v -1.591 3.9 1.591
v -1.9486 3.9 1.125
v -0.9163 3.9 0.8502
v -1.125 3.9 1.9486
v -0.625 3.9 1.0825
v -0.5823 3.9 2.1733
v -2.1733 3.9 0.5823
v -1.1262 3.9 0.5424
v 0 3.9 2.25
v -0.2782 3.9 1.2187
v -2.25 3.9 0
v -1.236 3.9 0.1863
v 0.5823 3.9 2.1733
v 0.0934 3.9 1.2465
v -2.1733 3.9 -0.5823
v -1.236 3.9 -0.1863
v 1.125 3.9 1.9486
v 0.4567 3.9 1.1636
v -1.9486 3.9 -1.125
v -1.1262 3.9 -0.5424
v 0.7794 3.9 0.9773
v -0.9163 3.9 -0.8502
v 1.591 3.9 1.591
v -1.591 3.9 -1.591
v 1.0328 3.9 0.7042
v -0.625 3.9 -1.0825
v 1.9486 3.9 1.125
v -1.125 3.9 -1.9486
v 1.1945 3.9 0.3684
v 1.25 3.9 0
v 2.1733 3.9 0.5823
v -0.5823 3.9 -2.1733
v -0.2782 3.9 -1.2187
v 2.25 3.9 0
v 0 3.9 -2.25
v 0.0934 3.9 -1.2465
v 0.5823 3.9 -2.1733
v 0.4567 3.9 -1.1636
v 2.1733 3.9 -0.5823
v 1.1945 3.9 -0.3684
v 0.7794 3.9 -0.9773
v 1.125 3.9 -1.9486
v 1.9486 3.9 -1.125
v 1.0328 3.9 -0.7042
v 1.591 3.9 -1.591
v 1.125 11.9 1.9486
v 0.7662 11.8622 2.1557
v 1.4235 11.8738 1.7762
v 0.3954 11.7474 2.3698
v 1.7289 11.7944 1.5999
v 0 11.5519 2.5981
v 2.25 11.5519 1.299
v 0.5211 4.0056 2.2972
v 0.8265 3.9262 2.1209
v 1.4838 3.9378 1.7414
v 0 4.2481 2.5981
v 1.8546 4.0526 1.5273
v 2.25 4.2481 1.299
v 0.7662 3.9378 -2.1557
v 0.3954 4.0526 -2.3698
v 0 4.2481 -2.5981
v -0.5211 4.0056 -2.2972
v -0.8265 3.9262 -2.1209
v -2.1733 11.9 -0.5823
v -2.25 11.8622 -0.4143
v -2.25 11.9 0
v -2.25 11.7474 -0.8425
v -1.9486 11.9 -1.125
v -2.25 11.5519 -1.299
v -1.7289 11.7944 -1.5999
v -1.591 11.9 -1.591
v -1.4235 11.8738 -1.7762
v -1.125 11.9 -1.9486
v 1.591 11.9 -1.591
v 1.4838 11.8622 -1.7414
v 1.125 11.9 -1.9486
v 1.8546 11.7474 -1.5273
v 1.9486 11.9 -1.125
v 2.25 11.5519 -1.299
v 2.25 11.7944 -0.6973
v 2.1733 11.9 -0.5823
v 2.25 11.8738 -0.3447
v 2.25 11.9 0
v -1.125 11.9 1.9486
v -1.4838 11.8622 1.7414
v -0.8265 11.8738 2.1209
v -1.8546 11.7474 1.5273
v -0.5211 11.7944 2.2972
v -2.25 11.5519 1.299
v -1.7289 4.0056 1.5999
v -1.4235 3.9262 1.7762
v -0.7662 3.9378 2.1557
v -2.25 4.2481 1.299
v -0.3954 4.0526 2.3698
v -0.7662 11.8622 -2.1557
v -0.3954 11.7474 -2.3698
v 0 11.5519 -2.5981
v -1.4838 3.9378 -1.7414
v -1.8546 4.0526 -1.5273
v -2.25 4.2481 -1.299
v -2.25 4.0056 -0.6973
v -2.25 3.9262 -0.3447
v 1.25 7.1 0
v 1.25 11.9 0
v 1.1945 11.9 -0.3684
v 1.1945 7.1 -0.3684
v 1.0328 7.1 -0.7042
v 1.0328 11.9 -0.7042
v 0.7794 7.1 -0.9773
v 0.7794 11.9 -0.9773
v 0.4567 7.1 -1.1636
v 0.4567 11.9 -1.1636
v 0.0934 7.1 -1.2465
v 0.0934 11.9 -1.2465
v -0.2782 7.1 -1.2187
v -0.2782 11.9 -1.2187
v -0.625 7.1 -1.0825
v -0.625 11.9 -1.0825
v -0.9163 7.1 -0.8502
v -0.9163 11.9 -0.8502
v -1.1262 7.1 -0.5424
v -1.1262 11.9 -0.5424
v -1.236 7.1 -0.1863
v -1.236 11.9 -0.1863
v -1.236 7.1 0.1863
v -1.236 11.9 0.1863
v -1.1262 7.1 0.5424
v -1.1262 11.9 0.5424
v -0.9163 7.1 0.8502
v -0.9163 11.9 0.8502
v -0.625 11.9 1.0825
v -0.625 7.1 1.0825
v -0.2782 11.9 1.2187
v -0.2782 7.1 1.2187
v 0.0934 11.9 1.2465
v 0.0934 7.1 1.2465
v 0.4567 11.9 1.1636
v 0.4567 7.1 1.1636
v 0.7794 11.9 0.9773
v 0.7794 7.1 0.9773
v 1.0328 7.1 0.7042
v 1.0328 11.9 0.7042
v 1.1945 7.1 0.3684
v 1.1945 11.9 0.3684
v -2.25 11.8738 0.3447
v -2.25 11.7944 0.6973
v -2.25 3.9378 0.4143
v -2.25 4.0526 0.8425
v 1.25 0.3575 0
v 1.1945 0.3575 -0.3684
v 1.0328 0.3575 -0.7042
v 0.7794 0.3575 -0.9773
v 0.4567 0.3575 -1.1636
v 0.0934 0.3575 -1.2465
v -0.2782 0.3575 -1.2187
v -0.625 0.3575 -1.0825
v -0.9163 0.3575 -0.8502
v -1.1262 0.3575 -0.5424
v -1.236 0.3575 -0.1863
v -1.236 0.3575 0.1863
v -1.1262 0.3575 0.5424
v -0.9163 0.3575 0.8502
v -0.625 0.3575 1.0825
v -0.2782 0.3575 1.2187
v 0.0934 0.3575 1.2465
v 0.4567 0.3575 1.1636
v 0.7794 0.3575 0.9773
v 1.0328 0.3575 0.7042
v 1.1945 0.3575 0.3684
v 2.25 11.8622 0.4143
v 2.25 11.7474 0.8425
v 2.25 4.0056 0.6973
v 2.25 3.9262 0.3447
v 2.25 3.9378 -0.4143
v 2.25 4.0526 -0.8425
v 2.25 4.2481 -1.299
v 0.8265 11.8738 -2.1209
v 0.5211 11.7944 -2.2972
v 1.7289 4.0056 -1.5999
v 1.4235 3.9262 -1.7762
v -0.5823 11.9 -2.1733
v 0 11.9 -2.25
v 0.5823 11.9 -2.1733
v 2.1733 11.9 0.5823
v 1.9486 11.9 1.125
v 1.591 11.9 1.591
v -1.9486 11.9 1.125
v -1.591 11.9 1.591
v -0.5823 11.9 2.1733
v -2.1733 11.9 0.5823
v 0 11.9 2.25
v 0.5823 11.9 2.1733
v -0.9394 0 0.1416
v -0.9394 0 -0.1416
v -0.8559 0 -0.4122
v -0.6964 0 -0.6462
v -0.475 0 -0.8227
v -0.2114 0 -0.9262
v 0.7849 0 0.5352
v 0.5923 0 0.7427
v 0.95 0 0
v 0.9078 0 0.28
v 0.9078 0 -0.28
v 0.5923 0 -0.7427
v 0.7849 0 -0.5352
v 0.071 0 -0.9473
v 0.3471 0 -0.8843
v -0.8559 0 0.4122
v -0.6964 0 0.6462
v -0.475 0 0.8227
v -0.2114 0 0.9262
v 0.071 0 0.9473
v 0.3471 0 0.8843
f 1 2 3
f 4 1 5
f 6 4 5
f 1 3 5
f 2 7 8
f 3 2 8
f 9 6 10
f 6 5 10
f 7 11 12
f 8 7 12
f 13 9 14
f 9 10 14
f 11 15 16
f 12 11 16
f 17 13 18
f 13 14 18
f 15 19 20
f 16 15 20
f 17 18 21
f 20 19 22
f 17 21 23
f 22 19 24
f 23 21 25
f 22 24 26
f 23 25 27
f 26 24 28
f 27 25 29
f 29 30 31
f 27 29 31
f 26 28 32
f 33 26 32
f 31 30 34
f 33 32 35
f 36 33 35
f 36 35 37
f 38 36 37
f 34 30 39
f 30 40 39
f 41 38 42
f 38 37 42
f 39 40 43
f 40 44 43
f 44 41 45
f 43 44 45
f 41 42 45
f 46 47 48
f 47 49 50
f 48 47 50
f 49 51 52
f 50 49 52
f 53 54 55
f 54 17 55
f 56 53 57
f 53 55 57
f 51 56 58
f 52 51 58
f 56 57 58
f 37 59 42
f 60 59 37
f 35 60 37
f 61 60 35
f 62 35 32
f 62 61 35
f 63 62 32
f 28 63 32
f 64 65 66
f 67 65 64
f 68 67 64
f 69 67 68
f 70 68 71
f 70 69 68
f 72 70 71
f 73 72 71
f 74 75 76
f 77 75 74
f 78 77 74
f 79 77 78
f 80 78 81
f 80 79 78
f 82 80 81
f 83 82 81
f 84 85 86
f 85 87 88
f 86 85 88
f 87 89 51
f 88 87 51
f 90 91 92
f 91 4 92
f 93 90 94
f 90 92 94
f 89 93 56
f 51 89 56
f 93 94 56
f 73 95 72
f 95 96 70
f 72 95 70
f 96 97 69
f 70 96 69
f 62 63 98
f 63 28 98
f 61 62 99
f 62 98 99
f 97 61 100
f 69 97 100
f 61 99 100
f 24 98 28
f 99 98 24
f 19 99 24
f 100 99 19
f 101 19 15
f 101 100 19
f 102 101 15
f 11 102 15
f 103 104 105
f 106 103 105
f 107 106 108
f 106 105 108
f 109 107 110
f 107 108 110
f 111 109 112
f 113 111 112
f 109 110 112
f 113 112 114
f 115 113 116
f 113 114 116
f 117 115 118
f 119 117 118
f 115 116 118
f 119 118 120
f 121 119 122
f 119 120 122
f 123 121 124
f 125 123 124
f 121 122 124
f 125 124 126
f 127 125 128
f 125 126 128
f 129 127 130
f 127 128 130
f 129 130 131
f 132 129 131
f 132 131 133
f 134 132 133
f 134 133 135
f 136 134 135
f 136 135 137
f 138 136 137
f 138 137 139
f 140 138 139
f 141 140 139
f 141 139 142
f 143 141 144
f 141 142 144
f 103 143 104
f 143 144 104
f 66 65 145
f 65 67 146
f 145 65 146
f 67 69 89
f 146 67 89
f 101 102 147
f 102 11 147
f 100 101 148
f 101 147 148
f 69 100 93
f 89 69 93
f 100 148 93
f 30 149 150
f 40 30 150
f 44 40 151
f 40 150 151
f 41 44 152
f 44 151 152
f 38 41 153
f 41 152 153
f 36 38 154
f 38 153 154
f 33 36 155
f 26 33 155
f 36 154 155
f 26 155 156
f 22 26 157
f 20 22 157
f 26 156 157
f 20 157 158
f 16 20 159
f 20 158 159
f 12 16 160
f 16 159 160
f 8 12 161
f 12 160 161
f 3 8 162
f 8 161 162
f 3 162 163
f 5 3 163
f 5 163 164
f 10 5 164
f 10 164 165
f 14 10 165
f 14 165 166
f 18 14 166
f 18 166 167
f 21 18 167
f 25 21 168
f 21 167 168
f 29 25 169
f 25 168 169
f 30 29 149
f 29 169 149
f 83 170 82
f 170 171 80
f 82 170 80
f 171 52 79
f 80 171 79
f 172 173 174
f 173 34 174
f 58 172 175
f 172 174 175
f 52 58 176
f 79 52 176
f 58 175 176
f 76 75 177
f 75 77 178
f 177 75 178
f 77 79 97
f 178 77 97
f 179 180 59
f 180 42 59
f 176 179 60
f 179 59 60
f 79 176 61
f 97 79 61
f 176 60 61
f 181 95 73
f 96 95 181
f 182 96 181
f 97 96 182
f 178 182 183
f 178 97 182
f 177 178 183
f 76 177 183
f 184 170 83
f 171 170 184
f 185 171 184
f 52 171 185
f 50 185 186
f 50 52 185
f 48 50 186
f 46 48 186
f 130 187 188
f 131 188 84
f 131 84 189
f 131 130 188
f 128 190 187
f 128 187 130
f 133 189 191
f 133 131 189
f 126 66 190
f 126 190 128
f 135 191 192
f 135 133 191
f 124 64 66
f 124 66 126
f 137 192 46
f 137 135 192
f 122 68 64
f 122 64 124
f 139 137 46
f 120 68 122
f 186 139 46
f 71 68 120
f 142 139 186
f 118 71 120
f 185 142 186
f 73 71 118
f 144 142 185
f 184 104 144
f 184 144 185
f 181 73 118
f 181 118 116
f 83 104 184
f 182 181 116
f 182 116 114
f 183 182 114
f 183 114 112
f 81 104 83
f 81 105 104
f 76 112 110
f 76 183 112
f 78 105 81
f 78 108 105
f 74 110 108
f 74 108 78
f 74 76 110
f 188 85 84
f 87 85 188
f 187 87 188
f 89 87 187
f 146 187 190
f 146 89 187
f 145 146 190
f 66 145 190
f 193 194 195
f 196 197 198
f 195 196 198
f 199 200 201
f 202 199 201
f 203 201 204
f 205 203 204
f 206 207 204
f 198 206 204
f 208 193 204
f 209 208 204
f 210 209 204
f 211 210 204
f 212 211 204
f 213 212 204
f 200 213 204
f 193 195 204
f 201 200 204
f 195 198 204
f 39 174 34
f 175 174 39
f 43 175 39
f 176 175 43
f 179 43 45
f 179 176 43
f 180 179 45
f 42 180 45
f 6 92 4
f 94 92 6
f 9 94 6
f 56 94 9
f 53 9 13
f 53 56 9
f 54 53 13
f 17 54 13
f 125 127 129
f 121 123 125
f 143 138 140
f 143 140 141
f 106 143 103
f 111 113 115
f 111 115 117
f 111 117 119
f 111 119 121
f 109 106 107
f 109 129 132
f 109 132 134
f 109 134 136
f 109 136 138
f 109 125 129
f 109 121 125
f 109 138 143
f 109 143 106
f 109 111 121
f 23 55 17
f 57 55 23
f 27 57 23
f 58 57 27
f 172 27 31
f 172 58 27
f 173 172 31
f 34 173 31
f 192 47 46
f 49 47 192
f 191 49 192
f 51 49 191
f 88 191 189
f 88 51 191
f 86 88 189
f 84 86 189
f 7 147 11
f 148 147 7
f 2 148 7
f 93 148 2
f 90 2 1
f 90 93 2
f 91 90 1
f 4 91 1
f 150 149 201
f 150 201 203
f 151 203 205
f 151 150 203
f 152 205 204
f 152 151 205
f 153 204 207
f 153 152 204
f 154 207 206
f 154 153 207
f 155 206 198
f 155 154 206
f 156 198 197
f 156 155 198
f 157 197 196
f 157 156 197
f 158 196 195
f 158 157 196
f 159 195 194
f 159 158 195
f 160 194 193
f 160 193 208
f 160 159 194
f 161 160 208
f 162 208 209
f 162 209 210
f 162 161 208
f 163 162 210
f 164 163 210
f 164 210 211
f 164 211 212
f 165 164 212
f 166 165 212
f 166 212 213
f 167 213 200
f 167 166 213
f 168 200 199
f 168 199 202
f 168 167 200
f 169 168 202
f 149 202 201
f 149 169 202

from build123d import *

# Parameters (mm, degrees)
SKETCH1_R           = 1.25
BOSS_EXTRUDE1_DEPTH = 3.9
BOSS_EXTRUDE2_DEPTH = 8
SKETCH3_R           = 1.25
CUT_EXTRUDE2_DEPTH  = 4.8
SKETCH4_OUTSIDE_W   = 35.048
SKETCH4_OUTSIDE_H   = 35.744
SKETCH4_OUTSIDE_R   = 2.25
CUT_EXTRUDE3_DEPTH  = 12.9
CUT_EXTRUDE3_TAPER  = 45
SKETCH5_OUTSIDE_W   = 27.248
SKETCH5_OUTSIDE_H   = 27.944
SKETCH5_OUTSIDE_R   = 2.25
CUT_EXTRUDE6_DEPTH  = 9
CUT_EXTRUDE6_TAPER  = 45
CHAMFER2_SIZE       = 0.3
CHAMFER2_SIZE2      = 0.357526078


with BuildPart() as part:
    # Sketch1 → Boss-Extrude1 (new body)
    with BuildSketch(Plane(origin=(0, 0, 0), x_dir=(1, 0, 0), z_dir=(0, 1, 0))):
        Circle(SKETCH1_R)
    extrude(amount=BOSS_EXTRUDE1_DEPTH)

    # Sketch2 → Boss-Extrude2 (add)
    with BuildSketch(Plane(origin=(0, 3.9, 0), x_dir=(1, 0, 0), z_dir=(0, 1, 0))):
        Polygon((0, 2.598076211), (-2.25, 1.299038106), (-2.25, -1.299038106), (0, -2.598076211), (2.25, -1.299038106), (2.25, 1.299038106), align=None)
    extrude(amount=BOSS_EXTRUDE2_DEPTH)

    # Sketch3 → Cut-Extrude2 (cut)
    with BuildSketch(Plane(origin=(0, 11.9, 0), x_dir=(1, 0, 0), z_dir=(0, 1, 0))):
        Circle(SKETCH3_R)
    extrude(amount=-CUT_EXTRUDE2_DEPTH, mode=Mode.SUBTRACT)

    # Sketch4 outside → Cut-Extrude3 (cut, through all)
    with BuildSketch(Plane(origin=(0, 11.9, 0), x_dir=(1, 0, 0), z_dir=(0, 1, 0))):
        Rectangle(SKETCH4_OUTSIDE_W, SKETCH4_OUTSIDE_H)
        Circle(SKETCH4_OUTSIDE_R, mode=Mode.SUBTRACT)
    extrude(amount=-CUT_EXTRUDE3_DEPTH, taper=CUT_EXTRUDE3_TAPER, mode=Mode.SUBTRACT)

    # Sketch5 outside → Cut-Extrude6 (cut, through all)
    with BuildSketch(Plane.XZ.offset(-3.9)):
        Rectangle(SKETCH5_OUTSIDE_W, SKETCH5_OUTSIDE_H)
        Circle(SKETCH5_OUTSIDE_R, mode=Mode.SUBTRACT)
    extrude(amount=-CUT_EXTRUDE6_DEPTH, taper=CUT_EXTRUDE6_TAPER, mode=Mode.SUBTRACT)

    # Chamfer2
    chamfer2_edges = [part.edges().sort_by_distance(p)[0] for p in [
        (-1.25, 0, 0),
    ]]
    chamfer2_side = [part.faces().sort_by_distance(p)[0] for p in [
        (0, 0, 0),
    ]]
    chamfer(chamfer2_edges, length=CHAMFER2_SIZE, length2=CHAMFER2_SIZE2, reference=chamfer2_side[0])


solid = part.part
